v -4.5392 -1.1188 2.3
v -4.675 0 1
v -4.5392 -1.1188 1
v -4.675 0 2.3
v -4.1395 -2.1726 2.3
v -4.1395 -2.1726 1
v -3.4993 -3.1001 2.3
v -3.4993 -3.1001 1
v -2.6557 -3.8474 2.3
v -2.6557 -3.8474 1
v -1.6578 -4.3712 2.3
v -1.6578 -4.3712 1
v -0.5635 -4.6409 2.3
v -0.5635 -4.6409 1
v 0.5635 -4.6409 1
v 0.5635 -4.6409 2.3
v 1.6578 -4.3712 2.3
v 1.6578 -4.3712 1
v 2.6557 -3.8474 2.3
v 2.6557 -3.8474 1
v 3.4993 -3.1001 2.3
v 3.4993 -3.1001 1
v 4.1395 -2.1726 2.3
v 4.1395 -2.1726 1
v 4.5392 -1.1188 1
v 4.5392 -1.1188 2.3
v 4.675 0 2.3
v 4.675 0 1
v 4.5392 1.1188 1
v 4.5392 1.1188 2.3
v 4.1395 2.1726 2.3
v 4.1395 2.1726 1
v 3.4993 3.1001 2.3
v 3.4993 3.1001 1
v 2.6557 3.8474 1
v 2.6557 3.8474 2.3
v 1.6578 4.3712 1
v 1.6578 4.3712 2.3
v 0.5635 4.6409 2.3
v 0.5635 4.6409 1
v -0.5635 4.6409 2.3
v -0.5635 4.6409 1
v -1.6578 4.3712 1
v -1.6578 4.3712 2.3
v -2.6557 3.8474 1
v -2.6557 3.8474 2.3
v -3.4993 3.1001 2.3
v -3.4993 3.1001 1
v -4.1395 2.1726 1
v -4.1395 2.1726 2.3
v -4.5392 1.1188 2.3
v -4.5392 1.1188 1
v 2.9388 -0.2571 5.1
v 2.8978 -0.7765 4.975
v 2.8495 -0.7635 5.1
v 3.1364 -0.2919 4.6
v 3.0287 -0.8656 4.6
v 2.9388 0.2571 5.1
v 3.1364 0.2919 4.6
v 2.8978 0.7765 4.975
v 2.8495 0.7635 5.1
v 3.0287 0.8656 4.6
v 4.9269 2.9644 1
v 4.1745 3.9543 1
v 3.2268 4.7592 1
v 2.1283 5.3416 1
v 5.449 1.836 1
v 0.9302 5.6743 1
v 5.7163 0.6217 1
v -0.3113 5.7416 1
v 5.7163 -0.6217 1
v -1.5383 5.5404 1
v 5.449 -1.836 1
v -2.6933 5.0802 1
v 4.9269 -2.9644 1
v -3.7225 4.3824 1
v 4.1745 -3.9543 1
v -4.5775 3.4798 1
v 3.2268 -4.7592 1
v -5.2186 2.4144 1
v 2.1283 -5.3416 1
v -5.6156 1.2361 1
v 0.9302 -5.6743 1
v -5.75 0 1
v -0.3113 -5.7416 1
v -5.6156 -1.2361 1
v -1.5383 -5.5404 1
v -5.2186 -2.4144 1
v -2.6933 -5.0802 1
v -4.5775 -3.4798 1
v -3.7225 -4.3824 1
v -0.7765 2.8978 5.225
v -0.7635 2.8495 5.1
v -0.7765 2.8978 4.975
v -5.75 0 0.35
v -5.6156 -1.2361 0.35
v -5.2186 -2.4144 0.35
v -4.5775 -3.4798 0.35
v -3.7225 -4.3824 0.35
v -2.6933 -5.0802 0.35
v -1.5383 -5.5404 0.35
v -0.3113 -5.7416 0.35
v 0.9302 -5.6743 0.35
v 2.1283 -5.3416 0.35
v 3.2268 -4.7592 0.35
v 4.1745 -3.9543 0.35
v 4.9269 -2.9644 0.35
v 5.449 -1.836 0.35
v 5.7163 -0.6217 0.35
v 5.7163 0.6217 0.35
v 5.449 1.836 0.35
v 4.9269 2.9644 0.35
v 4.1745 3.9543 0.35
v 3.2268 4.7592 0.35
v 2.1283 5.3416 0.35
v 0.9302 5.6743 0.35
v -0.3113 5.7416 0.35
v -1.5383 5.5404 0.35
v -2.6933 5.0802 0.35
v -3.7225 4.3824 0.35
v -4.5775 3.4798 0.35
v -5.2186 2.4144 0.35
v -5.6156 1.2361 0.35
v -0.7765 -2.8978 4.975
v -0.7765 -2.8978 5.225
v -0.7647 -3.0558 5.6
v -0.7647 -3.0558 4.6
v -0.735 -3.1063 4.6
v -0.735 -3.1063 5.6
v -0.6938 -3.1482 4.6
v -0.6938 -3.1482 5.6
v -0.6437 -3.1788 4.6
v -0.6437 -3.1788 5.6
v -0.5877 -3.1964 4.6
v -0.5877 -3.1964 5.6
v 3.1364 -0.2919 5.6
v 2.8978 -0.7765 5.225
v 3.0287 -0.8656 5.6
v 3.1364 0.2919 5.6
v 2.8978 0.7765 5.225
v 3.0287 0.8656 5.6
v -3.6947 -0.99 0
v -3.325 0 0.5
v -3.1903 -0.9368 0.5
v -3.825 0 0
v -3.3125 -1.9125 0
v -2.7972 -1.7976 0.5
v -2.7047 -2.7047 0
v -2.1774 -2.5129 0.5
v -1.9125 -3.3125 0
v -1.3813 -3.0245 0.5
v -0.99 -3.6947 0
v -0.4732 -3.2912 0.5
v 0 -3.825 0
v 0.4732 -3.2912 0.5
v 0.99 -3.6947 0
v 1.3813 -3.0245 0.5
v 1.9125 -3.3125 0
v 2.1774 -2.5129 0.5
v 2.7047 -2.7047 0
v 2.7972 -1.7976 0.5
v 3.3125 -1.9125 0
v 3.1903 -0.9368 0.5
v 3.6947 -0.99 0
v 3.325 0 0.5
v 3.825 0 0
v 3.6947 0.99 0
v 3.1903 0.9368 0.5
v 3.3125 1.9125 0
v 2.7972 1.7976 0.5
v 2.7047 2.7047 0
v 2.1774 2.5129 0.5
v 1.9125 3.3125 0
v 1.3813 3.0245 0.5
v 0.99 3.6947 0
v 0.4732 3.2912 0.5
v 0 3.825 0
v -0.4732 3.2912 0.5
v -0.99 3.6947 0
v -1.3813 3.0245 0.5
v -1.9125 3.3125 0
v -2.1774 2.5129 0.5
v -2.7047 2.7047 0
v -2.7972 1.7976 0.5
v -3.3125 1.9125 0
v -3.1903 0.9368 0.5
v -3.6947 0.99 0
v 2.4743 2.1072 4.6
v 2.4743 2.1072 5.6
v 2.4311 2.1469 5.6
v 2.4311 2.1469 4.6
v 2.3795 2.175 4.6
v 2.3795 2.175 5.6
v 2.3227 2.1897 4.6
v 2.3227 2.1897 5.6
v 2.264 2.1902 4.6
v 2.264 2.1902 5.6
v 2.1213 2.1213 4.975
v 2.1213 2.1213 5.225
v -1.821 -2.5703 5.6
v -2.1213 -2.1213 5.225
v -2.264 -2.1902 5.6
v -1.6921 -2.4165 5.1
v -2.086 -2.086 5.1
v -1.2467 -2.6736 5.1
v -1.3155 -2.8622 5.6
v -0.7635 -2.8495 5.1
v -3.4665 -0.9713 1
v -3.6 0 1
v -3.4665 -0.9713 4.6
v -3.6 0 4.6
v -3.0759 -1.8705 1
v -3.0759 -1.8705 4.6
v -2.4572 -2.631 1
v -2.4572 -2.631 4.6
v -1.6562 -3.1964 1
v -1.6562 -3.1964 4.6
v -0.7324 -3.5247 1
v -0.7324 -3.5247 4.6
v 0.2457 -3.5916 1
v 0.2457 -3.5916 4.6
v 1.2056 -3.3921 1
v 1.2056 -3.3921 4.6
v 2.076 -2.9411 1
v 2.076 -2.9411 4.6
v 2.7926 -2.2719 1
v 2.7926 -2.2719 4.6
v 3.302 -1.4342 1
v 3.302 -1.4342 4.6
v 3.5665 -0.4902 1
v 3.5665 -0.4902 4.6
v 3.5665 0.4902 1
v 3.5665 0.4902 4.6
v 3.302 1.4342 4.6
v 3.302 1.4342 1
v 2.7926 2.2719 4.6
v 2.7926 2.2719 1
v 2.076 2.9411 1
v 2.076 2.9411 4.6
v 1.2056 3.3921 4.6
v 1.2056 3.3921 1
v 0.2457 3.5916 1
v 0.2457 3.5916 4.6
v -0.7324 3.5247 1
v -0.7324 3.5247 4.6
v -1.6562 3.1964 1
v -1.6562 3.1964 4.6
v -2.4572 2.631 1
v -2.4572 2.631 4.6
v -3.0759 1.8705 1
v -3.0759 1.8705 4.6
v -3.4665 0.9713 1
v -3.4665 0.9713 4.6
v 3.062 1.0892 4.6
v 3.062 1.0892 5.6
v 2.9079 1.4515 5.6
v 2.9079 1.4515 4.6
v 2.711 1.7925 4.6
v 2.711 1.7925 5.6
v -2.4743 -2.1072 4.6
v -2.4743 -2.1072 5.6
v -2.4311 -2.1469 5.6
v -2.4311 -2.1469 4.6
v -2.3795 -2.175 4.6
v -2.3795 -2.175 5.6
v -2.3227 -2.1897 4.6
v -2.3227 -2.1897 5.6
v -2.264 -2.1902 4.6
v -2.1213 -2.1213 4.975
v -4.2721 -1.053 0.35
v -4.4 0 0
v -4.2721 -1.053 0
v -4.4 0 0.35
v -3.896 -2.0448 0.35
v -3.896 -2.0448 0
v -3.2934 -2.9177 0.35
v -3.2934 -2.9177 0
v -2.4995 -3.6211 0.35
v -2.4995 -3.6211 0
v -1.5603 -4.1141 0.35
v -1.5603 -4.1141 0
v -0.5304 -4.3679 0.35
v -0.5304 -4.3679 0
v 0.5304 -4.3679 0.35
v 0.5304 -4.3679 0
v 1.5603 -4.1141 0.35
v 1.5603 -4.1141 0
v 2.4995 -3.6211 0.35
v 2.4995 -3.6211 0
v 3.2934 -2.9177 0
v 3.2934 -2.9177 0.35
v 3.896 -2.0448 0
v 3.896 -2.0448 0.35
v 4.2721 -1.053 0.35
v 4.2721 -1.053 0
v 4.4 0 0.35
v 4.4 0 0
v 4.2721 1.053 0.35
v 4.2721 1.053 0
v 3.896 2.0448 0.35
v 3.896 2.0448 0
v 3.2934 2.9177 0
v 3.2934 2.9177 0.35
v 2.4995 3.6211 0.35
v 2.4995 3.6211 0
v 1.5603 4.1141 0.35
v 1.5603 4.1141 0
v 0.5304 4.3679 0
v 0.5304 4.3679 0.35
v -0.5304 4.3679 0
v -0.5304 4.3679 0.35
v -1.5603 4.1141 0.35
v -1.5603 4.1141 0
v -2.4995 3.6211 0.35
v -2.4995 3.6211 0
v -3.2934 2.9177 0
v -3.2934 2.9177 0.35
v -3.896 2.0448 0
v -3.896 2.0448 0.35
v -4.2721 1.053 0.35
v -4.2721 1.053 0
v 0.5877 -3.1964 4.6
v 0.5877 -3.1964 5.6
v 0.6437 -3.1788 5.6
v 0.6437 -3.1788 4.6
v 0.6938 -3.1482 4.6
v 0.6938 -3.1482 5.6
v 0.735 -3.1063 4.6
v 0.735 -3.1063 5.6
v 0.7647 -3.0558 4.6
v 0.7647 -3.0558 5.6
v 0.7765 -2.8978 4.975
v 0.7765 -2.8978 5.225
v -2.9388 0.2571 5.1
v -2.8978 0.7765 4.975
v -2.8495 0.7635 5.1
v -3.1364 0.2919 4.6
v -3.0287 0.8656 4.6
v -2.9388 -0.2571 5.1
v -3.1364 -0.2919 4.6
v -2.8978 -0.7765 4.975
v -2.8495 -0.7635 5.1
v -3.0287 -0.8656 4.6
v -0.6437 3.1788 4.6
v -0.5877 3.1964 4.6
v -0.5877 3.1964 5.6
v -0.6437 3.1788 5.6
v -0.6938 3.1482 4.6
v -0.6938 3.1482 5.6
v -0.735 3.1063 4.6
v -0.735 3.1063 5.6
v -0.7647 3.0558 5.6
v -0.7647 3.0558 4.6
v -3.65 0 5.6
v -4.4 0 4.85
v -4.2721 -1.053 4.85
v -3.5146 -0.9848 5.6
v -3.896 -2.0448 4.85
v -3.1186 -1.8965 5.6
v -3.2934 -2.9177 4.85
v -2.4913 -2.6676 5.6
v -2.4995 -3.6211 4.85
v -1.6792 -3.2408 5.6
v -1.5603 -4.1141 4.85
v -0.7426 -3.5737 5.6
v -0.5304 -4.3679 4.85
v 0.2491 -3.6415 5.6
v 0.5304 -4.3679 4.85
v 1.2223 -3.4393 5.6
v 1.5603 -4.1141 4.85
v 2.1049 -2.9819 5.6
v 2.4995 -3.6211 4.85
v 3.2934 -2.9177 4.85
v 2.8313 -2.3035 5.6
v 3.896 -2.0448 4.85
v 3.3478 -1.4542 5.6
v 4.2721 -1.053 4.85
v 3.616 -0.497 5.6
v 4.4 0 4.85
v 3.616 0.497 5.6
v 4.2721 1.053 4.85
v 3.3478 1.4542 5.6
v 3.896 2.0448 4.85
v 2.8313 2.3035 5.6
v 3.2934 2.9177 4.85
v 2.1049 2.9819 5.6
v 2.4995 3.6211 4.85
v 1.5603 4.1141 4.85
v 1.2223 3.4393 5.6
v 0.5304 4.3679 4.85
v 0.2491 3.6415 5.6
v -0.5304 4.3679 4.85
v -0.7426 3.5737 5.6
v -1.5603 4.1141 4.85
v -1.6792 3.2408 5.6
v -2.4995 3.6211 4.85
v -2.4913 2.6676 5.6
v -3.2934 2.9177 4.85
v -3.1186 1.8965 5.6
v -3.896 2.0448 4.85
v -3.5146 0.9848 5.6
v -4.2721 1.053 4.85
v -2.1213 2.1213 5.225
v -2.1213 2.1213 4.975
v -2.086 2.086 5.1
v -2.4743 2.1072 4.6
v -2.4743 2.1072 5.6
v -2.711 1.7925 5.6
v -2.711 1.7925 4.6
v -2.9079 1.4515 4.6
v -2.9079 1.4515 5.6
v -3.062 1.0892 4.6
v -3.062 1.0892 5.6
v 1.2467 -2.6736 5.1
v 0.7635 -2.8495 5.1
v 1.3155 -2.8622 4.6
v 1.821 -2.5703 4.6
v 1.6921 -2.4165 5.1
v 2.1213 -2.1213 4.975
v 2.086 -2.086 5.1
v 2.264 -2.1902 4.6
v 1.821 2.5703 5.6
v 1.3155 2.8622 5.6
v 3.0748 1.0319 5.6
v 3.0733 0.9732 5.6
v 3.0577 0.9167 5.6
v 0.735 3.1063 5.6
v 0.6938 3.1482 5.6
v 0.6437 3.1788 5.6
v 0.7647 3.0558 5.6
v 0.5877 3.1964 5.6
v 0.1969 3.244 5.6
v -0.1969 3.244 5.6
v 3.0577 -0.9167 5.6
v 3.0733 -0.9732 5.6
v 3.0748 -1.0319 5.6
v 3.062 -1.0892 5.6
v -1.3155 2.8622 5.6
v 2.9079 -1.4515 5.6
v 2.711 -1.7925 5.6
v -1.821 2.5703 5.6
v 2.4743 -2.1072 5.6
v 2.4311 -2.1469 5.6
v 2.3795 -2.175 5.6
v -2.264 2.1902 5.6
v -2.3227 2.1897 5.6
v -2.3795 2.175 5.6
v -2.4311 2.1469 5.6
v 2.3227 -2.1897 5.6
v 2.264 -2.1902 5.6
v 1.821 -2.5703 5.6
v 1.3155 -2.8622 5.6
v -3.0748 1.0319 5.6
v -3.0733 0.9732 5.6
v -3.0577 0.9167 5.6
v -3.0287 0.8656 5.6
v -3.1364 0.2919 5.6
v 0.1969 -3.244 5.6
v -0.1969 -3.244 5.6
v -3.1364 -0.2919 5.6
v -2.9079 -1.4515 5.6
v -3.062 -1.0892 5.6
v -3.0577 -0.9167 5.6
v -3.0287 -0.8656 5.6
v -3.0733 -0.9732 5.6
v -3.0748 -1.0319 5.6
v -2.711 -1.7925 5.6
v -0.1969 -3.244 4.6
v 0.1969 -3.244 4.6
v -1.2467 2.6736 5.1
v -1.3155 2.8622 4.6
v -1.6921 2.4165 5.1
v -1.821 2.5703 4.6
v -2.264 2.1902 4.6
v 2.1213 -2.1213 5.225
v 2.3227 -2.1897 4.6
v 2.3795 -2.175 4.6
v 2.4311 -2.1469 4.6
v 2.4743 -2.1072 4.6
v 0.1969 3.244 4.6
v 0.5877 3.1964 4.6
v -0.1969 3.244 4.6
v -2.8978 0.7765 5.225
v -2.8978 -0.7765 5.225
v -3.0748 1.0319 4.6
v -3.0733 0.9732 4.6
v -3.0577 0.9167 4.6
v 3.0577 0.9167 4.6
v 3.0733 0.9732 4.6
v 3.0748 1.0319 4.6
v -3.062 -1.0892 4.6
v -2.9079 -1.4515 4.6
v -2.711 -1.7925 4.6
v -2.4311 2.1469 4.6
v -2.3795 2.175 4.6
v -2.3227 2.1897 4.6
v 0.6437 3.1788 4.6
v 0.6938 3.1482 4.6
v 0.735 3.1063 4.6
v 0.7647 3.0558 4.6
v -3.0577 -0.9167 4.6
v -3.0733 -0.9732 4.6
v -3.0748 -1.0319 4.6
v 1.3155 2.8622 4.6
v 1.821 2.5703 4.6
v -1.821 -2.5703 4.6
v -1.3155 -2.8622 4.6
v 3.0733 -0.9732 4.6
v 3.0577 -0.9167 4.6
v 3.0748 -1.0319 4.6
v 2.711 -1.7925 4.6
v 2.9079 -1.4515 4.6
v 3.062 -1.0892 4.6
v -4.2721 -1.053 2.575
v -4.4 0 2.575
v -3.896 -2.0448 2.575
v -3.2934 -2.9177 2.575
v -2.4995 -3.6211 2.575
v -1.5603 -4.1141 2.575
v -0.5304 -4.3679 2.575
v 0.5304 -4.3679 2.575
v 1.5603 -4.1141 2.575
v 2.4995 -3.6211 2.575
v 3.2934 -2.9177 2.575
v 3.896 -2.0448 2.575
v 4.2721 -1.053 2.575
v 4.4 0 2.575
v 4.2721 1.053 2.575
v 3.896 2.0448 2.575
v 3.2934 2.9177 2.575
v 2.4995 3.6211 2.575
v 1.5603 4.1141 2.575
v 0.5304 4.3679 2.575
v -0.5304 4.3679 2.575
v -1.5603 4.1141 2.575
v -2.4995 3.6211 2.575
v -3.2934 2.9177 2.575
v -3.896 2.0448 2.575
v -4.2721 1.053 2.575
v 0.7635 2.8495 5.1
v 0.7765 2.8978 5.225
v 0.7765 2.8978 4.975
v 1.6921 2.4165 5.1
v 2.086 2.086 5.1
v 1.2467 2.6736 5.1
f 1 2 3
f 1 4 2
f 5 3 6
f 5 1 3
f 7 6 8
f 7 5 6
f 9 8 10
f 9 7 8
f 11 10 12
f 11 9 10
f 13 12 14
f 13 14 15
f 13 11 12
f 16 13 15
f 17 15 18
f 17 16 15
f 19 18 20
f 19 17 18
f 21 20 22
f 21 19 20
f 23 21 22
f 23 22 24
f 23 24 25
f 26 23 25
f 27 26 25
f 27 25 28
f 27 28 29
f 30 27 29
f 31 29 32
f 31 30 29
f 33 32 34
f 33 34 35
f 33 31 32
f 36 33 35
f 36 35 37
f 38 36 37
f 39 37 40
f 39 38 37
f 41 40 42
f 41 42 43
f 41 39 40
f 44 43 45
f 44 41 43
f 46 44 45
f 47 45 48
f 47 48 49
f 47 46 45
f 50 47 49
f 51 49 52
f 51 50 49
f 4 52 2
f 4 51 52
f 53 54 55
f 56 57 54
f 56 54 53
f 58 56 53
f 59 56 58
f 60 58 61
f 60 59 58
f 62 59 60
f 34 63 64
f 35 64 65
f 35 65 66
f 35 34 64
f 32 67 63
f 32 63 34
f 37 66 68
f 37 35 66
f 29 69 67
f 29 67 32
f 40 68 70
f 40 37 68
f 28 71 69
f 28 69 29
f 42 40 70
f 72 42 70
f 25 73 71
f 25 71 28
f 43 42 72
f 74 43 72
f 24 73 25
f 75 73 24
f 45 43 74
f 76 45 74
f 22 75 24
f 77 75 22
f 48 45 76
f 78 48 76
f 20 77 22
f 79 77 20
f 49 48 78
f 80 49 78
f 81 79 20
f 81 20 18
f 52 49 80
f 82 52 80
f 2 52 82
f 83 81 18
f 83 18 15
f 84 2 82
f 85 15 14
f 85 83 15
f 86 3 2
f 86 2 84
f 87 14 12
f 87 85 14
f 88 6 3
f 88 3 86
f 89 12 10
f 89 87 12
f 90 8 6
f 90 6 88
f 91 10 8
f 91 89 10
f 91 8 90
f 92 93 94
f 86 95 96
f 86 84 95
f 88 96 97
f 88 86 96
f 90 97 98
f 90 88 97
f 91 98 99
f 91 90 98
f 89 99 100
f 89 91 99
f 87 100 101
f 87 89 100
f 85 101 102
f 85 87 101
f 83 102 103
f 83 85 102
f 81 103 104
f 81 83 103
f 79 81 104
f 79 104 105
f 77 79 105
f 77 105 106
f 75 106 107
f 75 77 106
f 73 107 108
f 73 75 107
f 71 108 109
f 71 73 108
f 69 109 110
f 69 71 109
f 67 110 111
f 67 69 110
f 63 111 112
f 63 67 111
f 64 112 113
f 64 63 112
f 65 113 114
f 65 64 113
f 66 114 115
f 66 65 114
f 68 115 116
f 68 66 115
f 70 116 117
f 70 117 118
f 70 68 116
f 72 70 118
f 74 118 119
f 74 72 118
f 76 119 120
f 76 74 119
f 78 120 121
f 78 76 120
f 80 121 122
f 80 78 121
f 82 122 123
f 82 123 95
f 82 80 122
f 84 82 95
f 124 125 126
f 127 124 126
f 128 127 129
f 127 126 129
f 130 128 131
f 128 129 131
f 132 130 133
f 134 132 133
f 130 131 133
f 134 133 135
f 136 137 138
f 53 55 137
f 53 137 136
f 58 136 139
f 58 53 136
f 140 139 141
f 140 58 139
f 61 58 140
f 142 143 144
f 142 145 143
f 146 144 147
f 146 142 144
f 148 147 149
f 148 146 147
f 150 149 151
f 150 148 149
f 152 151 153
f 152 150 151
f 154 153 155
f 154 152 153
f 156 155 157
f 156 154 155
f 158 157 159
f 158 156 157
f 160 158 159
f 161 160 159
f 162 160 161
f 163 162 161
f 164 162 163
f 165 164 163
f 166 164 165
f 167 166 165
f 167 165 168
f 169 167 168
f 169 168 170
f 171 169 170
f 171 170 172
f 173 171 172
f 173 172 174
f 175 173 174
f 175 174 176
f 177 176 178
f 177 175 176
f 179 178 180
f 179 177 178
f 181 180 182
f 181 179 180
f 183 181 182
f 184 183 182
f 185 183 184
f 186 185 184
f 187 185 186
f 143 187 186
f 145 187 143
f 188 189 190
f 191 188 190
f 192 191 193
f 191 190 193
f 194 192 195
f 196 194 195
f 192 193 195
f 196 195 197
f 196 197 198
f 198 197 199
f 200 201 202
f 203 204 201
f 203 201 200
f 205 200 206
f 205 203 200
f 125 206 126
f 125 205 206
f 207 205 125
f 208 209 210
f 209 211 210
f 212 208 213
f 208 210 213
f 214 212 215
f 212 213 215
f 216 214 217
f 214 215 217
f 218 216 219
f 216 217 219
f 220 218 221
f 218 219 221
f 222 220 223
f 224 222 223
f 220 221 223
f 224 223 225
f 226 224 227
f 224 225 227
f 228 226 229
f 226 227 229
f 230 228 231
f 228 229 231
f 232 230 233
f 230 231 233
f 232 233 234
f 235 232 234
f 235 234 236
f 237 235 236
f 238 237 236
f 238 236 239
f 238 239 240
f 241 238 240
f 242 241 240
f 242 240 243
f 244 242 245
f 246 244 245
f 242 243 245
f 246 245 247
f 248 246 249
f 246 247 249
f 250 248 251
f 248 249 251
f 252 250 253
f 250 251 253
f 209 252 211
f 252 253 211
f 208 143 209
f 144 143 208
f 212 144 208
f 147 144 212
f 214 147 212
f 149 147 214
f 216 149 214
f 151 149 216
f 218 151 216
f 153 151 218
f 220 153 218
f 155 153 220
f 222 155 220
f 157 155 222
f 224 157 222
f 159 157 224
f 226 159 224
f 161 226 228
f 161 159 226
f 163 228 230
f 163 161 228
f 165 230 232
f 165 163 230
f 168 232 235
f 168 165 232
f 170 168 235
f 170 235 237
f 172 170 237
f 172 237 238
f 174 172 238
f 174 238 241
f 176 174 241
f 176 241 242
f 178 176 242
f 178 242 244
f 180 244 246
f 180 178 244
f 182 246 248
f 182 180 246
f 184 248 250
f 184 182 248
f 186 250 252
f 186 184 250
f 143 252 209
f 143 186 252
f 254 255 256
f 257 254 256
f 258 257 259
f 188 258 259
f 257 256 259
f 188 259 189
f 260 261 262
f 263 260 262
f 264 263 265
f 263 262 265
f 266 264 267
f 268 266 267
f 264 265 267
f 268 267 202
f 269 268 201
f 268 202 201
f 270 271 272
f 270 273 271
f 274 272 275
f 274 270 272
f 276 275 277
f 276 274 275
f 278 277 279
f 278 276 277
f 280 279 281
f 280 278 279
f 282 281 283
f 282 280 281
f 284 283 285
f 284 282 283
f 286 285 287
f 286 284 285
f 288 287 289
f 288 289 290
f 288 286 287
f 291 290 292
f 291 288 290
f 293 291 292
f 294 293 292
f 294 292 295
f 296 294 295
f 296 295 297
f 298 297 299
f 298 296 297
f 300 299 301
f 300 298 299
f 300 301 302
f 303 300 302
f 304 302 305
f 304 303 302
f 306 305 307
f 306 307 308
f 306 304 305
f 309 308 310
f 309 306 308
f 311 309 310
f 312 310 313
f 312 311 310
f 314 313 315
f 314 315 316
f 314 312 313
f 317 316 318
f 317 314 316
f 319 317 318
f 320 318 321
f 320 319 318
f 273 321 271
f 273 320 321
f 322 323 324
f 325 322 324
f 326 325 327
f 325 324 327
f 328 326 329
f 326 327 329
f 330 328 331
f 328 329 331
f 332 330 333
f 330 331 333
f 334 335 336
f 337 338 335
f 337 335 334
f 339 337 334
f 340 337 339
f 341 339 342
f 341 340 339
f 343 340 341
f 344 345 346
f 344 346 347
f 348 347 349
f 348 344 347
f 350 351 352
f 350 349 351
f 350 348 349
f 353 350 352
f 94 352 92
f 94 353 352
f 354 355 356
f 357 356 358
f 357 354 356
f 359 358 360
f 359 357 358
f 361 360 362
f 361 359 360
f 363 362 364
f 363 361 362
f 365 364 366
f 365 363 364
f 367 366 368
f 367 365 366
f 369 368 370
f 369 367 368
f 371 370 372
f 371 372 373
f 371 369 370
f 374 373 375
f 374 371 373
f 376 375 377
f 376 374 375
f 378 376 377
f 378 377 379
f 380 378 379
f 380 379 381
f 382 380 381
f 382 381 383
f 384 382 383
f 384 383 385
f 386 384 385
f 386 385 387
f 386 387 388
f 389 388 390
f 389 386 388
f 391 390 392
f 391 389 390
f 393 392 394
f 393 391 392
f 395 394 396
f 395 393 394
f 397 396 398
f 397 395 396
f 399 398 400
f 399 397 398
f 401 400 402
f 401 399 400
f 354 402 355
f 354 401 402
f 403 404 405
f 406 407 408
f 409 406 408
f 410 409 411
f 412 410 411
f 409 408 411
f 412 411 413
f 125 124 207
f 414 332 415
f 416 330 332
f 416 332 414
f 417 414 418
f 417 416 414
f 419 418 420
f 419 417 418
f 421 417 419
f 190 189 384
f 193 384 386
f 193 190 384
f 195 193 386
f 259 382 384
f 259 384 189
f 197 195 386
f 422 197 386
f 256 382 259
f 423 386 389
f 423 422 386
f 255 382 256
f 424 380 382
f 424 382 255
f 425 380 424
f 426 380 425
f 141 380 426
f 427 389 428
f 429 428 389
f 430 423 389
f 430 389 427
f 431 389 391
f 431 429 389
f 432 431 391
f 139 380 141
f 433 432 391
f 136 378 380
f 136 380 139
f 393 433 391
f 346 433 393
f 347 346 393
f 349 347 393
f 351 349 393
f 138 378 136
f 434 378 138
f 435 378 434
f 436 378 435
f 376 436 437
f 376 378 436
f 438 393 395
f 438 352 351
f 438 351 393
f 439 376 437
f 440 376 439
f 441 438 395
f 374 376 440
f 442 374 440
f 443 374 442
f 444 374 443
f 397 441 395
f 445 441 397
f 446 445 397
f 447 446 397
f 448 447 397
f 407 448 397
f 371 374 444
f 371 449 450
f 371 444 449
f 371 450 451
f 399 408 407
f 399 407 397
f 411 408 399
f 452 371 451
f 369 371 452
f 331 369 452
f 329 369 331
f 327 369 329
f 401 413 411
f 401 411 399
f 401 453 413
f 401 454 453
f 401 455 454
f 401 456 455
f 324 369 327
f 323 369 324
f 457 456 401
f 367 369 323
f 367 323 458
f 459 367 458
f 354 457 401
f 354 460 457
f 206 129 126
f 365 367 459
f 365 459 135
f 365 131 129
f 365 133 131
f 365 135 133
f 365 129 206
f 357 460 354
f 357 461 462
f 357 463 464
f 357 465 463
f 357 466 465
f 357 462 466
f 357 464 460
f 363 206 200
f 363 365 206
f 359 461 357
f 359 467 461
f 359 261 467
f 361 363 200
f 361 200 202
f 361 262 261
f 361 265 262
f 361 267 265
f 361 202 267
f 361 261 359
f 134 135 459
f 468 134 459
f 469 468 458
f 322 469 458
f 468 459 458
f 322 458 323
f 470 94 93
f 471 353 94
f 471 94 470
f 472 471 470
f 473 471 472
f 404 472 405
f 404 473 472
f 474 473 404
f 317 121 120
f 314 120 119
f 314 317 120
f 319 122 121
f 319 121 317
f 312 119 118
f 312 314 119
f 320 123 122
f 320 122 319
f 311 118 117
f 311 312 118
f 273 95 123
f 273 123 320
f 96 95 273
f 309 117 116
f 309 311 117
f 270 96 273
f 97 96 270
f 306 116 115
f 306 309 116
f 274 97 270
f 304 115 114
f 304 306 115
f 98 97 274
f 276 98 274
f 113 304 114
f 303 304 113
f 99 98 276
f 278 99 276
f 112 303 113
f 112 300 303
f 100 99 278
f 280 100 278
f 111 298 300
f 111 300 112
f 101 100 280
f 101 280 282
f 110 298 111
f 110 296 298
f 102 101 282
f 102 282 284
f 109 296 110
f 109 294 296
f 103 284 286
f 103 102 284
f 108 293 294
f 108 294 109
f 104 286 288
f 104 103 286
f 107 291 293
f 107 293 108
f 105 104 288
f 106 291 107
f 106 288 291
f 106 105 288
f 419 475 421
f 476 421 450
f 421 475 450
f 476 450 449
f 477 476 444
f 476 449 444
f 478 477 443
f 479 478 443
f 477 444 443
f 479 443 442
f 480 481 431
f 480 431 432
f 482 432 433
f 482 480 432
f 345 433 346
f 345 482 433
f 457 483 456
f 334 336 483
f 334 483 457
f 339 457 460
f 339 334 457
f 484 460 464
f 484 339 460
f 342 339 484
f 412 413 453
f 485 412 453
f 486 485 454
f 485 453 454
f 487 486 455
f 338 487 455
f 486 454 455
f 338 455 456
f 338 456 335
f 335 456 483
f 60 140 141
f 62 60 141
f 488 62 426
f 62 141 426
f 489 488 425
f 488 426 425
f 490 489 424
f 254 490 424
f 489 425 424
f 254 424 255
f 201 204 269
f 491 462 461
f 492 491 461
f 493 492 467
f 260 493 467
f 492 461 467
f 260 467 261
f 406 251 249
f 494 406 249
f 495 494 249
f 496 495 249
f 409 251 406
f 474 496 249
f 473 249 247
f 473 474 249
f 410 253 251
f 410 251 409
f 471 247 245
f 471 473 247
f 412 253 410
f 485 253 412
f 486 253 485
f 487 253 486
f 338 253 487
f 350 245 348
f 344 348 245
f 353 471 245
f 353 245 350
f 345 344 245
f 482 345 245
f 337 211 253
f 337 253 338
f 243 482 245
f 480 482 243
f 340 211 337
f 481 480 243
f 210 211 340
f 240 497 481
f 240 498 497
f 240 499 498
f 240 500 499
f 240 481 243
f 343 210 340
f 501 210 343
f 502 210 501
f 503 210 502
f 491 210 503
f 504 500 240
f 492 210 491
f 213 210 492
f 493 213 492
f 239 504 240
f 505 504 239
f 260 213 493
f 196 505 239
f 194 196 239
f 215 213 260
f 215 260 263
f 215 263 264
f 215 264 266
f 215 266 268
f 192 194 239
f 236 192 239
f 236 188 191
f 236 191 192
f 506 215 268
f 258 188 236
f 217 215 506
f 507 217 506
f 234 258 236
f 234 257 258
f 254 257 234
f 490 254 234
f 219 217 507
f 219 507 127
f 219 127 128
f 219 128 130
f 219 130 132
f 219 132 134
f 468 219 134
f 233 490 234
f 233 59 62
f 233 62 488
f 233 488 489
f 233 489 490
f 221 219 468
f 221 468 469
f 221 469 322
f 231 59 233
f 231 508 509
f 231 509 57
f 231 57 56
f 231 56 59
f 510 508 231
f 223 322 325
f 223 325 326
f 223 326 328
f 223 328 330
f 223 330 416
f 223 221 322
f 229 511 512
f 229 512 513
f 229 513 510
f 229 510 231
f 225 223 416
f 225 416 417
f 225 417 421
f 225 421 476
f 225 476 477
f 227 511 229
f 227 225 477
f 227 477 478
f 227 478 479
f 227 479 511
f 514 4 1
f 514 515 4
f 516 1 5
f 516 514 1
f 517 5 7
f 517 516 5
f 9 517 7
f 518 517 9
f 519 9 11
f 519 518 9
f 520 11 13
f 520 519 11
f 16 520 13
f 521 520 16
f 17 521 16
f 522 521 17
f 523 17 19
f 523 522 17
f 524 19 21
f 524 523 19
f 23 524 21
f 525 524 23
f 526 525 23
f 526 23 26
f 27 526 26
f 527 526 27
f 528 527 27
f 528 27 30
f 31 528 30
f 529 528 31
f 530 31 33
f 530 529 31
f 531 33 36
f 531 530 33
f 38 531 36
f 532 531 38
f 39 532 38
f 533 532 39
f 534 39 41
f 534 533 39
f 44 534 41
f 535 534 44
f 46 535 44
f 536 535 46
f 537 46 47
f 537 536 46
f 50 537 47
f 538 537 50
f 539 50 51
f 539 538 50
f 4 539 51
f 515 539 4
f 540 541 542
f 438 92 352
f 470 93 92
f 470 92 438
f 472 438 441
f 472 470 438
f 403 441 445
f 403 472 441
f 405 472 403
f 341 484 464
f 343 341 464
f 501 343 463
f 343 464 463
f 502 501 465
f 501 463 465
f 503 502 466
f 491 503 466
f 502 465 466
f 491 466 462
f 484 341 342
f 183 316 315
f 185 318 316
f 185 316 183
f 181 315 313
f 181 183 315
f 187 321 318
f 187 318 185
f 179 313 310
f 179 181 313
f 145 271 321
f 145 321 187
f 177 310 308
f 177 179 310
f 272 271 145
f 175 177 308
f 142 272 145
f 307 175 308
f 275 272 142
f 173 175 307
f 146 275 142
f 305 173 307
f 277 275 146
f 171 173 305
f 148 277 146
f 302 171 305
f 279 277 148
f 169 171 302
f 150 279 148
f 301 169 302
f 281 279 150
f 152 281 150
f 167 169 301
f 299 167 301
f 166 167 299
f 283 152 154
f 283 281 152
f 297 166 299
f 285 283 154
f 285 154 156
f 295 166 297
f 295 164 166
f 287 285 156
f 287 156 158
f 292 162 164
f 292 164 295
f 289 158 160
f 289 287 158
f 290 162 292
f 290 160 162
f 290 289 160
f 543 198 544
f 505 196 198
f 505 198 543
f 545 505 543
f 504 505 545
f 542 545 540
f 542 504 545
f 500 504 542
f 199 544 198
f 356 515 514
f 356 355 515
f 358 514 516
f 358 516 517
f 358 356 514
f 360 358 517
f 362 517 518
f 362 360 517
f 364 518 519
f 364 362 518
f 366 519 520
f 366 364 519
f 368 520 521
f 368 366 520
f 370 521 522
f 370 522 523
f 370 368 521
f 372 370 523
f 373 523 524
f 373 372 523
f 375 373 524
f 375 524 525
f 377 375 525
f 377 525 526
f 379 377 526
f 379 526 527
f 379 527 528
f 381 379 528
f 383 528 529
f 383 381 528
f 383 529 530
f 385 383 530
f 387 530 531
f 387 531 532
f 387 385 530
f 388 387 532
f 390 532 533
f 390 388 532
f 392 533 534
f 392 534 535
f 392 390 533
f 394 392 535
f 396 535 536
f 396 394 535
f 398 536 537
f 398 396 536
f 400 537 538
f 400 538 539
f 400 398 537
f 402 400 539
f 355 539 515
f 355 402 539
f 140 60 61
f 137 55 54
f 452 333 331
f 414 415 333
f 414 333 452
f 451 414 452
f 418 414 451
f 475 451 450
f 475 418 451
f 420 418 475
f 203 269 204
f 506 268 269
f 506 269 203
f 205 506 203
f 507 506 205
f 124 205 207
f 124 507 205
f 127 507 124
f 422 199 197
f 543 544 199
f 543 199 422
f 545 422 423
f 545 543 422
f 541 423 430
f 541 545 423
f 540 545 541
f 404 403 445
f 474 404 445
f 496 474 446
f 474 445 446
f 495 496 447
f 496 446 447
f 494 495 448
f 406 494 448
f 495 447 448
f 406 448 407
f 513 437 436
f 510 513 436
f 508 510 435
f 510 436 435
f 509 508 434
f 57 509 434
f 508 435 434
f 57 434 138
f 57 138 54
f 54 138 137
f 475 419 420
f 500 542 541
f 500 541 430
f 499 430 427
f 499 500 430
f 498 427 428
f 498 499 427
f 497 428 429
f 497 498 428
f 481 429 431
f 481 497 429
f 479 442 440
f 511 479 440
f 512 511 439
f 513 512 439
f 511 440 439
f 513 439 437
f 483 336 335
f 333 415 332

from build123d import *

# Parameters (mm, degrees)
POCKET_DEPTH       = 34.402163
POCKET_DEPTH_BACK  = 40.002163
POLARPATTERN_COUNT = 6


with BuildPart() as part:
    # Sketch → Revolution (revolve)
    with BuildSketch(Plane.XZ):
        Polygon((-3.6, 4.6), (-3.6, 3.5), (-3.6, 2.5), (-3.6, 1), (-3.325, 0.5), (-3.825, 0), (-4.4, 0), (-4.4, 0.35), (-5.75, 0.35), (-5.75, 1), (-4.675, 1), (-4.675, 2.3), (-4.4, 2.575), (-4.4, 4.85), (-3.65, 5.6), (-3.15, 5.6), (-2.95, 5.1), (-3.15, 4.6), align=None)
    revolve(axis=Axis((0, 0, 0), (0, 0, 1)))

    # Sketch001 → Pocket (cut, two sides)
    with BuildSketch(Plane.XY) as pocket_sk:
        with BuildLine():
            Line((0, 0), (-0.776457, 2.897777))
            ThreePointArc((-0.587735, 3.196415), (-0.747472, 3.08841), (-0.776457, 2.897777))
            ThreePointArc((0.587735, 3.196415), (0, 3.25), (-0.587735, 3.196415))
            ThreePointArc((0.776457, 2.897777), (0.747472, 3.08841), (0.587735, 3.196415))
            Line((0.776457, 2.897777), (0, 0))
        make_face()
    pocket = extrude(amount=-POCKET_DEPTH, mode=Mode.SUBTRACT) + extrude(pocket_sk.sketch, amount=POCKET_DEPTH_BACK, mode=Mode.SUBTRACT)

    # PolarPattern: Pocket ×6 about axis
    polarpattern_axis = Axis((0, 0, 0), (0, 0, 1))
    for i in range(1, POLARPATTERN_COUNT):
        add(pocket.rotate(polarpattern_axis, i * 360 / POLARPATTERN_COUNT), mode=Mode.SUBTRACT)


solid = part.part
